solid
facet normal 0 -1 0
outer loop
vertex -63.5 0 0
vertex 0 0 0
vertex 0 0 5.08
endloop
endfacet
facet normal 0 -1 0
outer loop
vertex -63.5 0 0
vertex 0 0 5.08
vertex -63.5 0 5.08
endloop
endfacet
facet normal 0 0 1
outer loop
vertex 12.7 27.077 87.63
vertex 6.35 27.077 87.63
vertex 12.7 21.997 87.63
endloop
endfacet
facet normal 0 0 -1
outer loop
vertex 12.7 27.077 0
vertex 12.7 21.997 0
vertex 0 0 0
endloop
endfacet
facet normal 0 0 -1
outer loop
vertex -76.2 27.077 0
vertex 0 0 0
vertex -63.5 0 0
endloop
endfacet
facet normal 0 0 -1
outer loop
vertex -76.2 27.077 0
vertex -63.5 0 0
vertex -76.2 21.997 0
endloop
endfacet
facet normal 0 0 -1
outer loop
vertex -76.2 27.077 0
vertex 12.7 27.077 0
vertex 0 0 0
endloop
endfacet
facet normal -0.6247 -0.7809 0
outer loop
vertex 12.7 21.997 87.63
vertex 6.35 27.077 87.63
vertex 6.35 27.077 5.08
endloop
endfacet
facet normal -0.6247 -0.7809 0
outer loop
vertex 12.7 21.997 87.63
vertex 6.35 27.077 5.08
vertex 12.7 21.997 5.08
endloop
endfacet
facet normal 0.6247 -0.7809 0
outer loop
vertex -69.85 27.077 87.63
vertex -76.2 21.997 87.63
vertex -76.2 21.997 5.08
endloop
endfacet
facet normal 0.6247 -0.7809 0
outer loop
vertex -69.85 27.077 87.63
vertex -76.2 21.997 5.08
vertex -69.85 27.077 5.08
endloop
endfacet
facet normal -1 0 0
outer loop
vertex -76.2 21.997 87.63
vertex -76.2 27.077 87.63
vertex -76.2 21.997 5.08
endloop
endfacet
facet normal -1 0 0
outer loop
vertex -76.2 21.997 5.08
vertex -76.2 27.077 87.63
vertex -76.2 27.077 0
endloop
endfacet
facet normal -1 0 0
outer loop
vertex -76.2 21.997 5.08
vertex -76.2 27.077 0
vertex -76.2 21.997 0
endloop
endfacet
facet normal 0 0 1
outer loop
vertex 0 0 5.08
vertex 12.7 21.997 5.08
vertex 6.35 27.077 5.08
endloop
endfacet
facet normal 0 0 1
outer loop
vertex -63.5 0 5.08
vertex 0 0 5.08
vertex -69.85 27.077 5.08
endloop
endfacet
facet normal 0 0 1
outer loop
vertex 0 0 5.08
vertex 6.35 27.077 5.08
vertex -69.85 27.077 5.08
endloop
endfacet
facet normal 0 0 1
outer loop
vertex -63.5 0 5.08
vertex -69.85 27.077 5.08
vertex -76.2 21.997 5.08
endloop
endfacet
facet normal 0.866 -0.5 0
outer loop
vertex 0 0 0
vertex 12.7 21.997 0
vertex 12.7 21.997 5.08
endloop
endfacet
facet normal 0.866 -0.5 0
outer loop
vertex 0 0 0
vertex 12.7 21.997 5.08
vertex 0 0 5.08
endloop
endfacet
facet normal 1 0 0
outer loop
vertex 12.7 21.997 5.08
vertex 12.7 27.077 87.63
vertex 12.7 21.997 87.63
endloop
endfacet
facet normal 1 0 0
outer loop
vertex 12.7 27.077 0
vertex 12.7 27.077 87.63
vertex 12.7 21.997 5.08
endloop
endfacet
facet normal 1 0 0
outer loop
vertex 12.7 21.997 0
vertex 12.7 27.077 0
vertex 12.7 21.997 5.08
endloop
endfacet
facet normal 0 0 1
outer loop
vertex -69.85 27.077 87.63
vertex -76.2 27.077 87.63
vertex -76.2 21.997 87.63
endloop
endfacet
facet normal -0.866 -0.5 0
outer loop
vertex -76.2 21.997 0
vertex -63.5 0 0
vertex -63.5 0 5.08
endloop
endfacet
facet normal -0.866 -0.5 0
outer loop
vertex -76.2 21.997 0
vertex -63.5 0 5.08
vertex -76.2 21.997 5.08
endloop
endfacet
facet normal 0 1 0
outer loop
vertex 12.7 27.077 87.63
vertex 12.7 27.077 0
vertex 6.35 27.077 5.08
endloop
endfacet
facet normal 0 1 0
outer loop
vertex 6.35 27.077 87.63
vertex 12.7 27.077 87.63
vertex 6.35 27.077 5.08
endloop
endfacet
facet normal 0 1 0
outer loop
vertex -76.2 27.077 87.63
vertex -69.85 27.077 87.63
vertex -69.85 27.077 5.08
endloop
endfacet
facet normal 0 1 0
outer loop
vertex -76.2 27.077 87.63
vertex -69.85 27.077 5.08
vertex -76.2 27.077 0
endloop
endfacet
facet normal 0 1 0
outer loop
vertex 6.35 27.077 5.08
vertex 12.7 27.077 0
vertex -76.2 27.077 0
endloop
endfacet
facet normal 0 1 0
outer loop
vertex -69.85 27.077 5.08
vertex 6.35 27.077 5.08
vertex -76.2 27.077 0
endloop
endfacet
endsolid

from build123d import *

# Parameters (mm, degrees)
BOSS_EXTRUDE1_DEPTH = 5.08
BOSS_EXTRUDE2_DEPTH = 82.55


with BuildPart() as part:
    # Sketch1 → Boss-Extrude1 (new body)
    with BuildSketch(Plane.XY):
        Polygon((0, 0), (-63.5, 0), (-76.2, 21.997045256), (-76.2, 27.077045256), (12.7, 27.077045256), (12.7, 21.997045256), align=None)
    extrude(amount=BOSS_EXTRUDE1_DEPTH)

    # Sketch2 → Boss-Extrude2 (add)
    with BuildSketch(Plane.XY.offset(5.08)):
        Polygon((-76.2, 21.997045256), (-69.85, 27.077045256), (-76.2, 27.077045256), align=None)
        Polygon((12.7, 21.997045256), (12.7, 27.077045256), (6.35, 27.077045256), align=None)
    extrude(amount=BOSS_EXTRUDE2_DEPTH)


solid = part.part
